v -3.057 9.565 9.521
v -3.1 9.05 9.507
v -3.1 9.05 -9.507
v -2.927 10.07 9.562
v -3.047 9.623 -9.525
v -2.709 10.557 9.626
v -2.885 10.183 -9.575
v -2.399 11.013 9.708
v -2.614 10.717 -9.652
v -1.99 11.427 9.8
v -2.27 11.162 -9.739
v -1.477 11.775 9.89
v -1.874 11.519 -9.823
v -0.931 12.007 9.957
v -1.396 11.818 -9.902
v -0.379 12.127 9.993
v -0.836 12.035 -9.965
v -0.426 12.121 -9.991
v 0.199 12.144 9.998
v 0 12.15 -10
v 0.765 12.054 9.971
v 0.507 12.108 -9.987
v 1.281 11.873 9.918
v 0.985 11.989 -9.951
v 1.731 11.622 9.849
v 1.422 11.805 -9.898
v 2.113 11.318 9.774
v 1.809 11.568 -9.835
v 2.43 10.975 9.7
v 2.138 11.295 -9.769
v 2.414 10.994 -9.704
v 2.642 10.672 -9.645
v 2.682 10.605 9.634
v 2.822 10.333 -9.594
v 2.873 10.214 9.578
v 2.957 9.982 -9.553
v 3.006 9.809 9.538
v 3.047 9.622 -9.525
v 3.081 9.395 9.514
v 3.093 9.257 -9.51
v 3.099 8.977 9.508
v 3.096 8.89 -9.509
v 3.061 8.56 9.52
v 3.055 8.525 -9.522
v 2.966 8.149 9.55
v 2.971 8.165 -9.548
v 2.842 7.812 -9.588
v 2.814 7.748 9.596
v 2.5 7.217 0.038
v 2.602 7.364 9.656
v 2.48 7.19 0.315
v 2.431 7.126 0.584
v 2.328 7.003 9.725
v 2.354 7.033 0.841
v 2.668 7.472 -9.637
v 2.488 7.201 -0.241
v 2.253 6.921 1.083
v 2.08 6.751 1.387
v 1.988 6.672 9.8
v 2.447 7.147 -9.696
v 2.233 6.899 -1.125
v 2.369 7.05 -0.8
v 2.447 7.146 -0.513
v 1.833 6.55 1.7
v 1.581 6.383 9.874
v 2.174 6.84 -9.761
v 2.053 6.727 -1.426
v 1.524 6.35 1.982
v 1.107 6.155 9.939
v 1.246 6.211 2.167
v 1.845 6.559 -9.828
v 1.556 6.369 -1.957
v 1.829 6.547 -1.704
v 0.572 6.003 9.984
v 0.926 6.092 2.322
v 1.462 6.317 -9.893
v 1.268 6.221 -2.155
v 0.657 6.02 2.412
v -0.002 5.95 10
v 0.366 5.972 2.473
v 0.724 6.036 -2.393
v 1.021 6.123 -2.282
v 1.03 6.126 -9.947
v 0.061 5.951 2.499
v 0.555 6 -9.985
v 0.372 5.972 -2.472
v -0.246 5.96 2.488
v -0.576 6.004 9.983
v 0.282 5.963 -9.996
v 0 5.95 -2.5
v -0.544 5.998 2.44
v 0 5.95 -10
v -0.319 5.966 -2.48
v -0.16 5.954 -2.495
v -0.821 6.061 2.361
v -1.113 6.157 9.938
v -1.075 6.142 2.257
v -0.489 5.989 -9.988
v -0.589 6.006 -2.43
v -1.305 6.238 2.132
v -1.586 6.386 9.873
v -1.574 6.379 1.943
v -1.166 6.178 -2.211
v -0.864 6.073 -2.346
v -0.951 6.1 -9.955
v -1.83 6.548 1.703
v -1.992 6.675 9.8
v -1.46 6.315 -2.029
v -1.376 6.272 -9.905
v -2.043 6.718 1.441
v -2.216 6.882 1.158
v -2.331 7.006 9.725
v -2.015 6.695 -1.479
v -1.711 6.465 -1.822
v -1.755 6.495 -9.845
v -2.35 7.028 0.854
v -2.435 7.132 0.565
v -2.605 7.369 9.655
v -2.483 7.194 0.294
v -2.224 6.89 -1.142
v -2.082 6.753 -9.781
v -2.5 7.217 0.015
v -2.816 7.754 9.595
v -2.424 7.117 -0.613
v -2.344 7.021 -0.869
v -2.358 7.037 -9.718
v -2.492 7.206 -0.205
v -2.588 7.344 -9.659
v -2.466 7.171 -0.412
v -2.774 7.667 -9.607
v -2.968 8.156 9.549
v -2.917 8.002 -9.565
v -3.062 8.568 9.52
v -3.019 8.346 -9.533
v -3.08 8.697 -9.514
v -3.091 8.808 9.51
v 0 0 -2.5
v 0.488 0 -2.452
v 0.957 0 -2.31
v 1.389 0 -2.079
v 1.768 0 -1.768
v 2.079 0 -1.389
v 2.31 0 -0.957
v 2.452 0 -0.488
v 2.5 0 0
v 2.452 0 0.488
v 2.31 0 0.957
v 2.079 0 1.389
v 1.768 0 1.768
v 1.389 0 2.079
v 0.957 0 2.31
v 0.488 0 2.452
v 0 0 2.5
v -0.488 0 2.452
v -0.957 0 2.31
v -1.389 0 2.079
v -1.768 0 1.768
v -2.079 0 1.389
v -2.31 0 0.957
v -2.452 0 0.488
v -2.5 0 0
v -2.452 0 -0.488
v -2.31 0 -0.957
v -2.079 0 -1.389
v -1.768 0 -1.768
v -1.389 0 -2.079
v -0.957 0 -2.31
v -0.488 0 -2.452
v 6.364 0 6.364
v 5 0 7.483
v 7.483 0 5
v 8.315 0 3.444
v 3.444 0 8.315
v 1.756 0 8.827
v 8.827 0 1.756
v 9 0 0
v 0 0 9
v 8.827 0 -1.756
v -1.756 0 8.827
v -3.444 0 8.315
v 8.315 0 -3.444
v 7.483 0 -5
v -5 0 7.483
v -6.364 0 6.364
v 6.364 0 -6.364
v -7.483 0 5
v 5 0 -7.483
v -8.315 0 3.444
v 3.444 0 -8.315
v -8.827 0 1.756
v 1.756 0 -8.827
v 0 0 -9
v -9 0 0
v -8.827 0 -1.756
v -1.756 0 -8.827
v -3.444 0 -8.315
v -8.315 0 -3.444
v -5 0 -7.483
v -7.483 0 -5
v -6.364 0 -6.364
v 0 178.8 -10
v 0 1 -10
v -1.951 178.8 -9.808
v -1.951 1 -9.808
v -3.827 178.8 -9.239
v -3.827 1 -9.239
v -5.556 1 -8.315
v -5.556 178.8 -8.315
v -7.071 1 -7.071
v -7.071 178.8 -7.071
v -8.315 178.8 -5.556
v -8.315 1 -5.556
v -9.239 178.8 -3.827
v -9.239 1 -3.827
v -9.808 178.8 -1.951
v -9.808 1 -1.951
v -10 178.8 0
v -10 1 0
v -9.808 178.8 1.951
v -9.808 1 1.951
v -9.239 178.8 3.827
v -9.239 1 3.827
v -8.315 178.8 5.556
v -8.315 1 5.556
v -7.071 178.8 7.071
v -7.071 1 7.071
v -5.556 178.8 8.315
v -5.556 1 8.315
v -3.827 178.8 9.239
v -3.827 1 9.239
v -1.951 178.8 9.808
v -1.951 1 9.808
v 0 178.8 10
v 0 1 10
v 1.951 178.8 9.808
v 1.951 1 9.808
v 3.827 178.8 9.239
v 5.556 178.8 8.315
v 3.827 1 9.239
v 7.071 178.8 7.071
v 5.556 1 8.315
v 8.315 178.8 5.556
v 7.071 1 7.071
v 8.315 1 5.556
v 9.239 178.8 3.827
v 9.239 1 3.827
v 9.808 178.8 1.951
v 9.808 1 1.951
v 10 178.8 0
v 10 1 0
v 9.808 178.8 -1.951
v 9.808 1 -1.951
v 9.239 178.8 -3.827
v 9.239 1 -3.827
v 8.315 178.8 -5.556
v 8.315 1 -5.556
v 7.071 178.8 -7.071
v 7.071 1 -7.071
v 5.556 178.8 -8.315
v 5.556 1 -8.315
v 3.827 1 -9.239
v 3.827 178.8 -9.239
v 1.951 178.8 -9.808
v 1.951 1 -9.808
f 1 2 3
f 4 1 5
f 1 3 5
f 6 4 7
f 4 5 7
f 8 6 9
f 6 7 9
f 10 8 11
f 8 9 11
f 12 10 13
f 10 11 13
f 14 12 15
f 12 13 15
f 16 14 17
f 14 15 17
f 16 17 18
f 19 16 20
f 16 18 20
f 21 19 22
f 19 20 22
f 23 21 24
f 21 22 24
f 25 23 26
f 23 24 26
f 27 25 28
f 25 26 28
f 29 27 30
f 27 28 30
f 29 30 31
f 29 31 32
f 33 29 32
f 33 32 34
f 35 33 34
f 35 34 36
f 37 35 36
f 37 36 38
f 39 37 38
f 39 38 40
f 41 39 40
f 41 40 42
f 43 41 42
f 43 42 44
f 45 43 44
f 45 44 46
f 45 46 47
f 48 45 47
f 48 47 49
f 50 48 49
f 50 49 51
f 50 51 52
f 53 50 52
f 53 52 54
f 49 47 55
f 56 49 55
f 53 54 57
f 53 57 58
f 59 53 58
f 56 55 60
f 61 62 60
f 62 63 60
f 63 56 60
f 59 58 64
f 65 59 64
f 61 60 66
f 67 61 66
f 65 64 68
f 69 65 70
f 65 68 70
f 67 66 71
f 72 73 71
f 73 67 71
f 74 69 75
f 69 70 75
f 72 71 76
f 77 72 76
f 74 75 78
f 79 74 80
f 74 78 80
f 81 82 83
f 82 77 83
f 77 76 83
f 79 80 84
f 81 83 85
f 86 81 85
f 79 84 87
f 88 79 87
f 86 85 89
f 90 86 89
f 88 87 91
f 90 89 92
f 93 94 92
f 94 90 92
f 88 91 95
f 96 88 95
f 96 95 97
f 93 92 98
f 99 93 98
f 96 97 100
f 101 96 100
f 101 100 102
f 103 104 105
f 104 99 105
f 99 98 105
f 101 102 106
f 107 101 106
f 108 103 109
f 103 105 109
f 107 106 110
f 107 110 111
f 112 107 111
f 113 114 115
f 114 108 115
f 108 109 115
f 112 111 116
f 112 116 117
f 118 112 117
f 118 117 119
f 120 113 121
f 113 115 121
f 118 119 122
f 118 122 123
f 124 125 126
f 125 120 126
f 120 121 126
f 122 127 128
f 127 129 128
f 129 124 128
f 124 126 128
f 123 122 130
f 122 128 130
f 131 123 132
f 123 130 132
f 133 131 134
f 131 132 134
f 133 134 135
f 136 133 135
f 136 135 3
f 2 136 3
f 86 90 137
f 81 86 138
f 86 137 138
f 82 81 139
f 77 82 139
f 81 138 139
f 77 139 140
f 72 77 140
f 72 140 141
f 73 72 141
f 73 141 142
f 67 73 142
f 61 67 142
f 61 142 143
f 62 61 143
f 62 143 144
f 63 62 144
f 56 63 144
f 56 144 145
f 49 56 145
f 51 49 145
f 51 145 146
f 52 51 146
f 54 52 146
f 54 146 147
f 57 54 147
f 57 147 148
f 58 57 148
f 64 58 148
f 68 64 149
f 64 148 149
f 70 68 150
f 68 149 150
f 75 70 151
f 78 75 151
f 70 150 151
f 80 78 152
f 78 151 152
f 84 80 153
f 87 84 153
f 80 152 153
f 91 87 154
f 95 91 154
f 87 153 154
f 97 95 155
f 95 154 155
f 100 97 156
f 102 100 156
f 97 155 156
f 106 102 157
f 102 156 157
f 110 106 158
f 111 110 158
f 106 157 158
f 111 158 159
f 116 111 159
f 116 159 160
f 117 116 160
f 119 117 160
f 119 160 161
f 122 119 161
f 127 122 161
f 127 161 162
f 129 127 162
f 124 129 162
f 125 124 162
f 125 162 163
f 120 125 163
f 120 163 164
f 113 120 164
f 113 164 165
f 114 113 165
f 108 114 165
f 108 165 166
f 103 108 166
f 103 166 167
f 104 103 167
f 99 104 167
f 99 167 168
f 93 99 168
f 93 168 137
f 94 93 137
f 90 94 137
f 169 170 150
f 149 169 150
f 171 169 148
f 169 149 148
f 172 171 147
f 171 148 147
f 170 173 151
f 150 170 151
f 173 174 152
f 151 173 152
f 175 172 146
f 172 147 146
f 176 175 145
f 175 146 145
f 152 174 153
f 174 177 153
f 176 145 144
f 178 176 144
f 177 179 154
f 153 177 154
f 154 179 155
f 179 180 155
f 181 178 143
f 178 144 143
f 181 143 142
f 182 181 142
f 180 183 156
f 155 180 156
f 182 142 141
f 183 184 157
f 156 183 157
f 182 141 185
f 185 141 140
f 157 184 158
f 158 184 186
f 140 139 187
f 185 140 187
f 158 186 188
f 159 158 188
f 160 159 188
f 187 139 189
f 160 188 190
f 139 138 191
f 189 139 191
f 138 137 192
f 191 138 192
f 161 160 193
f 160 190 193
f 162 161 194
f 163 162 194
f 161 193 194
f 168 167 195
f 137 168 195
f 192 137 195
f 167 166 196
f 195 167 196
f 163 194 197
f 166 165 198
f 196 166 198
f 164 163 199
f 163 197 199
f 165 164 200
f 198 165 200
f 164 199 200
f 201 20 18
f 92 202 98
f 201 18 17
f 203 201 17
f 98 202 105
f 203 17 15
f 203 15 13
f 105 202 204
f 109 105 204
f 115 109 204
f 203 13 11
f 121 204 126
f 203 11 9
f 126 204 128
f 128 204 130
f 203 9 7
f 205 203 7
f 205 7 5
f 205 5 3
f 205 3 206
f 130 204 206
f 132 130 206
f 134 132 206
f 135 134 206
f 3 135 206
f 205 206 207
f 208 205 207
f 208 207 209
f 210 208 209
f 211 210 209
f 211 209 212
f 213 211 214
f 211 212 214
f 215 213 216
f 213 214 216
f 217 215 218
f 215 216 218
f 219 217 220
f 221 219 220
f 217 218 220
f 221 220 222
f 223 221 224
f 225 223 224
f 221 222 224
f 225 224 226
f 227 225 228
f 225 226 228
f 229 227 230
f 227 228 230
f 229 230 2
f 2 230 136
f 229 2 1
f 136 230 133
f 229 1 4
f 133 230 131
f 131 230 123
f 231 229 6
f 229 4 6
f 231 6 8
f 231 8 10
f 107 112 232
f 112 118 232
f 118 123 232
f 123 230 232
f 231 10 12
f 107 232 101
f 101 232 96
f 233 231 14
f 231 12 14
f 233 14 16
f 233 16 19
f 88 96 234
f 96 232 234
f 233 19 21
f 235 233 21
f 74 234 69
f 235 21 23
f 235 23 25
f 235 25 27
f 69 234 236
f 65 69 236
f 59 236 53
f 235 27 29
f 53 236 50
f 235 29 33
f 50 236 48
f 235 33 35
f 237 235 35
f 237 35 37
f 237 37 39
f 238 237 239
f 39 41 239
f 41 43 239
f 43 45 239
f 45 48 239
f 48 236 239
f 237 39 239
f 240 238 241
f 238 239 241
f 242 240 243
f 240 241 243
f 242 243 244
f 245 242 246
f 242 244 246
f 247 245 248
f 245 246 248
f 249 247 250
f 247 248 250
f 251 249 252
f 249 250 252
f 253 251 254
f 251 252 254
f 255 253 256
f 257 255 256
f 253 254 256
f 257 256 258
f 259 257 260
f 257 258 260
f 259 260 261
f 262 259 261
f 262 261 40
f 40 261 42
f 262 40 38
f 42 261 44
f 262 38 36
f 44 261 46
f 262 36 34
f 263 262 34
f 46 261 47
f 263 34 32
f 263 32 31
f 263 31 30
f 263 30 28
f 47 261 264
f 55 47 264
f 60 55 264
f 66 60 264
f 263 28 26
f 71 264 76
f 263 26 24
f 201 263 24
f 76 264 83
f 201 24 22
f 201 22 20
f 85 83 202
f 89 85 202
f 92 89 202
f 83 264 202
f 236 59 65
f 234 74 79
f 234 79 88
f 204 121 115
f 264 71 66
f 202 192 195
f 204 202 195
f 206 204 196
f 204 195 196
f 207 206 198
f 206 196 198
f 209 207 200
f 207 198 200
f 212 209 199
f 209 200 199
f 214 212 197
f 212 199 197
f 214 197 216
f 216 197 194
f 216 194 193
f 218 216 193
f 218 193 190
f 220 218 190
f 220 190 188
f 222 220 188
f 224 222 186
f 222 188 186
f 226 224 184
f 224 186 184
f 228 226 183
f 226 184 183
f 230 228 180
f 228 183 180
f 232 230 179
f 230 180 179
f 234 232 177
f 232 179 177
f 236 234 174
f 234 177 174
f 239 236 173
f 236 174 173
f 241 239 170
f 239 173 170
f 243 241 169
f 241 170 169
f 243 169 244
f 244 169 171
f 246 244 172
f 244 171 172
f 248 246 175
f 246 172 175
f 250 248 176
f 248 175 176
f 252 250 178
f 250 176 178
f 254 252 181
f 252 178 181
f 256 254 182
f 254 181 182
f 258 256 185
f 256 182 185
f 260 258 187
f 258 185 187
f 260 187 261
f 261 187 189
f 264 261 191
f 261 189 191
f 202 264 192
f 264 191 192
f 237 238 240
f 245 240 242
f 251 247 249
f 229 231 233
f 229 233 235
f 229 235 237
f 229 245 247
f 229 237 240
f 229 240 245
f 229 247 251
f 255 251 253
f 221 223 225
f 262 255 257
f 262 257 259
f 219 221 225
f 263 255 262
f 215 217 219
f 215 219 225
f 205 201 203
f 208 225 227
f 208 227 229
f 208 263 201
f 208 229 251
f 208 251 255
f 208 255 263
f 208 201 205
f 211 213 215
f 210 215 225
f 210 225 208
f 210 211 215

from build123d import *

# Parameters (mm, degrees)
SKETCH1_R           = 10
BOSS_EXTRUDE1_DEPTH = 178.8
CHAMFER1_SIZE       = 1
SKETCH2_R           = 3.1
CUT_EXTRUDE1_DEPTH  = 155
SKETCH_1_R          = 2.5
CUT_EXTRUDE_1_DEPTH = 10


with BuildPart() as part:
    # Sketch1 → Boss-Extrude1 (new body)
    with BuildSketch(Plane(origin=(0, 0, 0), x_dir=(1, 0, 0), z_dir=(0, 1, 0))):
        with Locations(Location((0, 0, 0), (0, 0, 90))):
            Circle(SKETCH1_R)
    extrude(amount=BOSS_EXTRUDE1_DEPTH)

    # Chamfer1
    chamfer1_edges = [part.edges().sort_by_distance(p)[0] for p in [
        (0, 0, 10),
    ]]
    chamfer(chamfer1_edges, length=CHAMFER1_SIZE)

    # Sketch2 → Cut-Extrude1 (cut)
    with BuildSketch(Plane(origin=(0, 0, -10), x_dir=(-1, 0, 0), z_dir=(0, 0, -1))):
        with Locations((0, 9.05)):
            Circle(SKETCH2_R)
    extrude(amount=-CUT_EXTRUDE1_DEPTH, mode=Mode.SUBTRACT)

    # 草图1 → 切除-拉伸1 (cut)
    with BuildSketch(Plane.XZ):
        with Locations(Location((0, 0, 0), (0, 0, 270))):
            Circle(SKETCH_1_R)
    extrude(amount=-CUT_EXTRUDE_1_DEPTH, mode=Mode.SUBTRACT)


solid = part.part
